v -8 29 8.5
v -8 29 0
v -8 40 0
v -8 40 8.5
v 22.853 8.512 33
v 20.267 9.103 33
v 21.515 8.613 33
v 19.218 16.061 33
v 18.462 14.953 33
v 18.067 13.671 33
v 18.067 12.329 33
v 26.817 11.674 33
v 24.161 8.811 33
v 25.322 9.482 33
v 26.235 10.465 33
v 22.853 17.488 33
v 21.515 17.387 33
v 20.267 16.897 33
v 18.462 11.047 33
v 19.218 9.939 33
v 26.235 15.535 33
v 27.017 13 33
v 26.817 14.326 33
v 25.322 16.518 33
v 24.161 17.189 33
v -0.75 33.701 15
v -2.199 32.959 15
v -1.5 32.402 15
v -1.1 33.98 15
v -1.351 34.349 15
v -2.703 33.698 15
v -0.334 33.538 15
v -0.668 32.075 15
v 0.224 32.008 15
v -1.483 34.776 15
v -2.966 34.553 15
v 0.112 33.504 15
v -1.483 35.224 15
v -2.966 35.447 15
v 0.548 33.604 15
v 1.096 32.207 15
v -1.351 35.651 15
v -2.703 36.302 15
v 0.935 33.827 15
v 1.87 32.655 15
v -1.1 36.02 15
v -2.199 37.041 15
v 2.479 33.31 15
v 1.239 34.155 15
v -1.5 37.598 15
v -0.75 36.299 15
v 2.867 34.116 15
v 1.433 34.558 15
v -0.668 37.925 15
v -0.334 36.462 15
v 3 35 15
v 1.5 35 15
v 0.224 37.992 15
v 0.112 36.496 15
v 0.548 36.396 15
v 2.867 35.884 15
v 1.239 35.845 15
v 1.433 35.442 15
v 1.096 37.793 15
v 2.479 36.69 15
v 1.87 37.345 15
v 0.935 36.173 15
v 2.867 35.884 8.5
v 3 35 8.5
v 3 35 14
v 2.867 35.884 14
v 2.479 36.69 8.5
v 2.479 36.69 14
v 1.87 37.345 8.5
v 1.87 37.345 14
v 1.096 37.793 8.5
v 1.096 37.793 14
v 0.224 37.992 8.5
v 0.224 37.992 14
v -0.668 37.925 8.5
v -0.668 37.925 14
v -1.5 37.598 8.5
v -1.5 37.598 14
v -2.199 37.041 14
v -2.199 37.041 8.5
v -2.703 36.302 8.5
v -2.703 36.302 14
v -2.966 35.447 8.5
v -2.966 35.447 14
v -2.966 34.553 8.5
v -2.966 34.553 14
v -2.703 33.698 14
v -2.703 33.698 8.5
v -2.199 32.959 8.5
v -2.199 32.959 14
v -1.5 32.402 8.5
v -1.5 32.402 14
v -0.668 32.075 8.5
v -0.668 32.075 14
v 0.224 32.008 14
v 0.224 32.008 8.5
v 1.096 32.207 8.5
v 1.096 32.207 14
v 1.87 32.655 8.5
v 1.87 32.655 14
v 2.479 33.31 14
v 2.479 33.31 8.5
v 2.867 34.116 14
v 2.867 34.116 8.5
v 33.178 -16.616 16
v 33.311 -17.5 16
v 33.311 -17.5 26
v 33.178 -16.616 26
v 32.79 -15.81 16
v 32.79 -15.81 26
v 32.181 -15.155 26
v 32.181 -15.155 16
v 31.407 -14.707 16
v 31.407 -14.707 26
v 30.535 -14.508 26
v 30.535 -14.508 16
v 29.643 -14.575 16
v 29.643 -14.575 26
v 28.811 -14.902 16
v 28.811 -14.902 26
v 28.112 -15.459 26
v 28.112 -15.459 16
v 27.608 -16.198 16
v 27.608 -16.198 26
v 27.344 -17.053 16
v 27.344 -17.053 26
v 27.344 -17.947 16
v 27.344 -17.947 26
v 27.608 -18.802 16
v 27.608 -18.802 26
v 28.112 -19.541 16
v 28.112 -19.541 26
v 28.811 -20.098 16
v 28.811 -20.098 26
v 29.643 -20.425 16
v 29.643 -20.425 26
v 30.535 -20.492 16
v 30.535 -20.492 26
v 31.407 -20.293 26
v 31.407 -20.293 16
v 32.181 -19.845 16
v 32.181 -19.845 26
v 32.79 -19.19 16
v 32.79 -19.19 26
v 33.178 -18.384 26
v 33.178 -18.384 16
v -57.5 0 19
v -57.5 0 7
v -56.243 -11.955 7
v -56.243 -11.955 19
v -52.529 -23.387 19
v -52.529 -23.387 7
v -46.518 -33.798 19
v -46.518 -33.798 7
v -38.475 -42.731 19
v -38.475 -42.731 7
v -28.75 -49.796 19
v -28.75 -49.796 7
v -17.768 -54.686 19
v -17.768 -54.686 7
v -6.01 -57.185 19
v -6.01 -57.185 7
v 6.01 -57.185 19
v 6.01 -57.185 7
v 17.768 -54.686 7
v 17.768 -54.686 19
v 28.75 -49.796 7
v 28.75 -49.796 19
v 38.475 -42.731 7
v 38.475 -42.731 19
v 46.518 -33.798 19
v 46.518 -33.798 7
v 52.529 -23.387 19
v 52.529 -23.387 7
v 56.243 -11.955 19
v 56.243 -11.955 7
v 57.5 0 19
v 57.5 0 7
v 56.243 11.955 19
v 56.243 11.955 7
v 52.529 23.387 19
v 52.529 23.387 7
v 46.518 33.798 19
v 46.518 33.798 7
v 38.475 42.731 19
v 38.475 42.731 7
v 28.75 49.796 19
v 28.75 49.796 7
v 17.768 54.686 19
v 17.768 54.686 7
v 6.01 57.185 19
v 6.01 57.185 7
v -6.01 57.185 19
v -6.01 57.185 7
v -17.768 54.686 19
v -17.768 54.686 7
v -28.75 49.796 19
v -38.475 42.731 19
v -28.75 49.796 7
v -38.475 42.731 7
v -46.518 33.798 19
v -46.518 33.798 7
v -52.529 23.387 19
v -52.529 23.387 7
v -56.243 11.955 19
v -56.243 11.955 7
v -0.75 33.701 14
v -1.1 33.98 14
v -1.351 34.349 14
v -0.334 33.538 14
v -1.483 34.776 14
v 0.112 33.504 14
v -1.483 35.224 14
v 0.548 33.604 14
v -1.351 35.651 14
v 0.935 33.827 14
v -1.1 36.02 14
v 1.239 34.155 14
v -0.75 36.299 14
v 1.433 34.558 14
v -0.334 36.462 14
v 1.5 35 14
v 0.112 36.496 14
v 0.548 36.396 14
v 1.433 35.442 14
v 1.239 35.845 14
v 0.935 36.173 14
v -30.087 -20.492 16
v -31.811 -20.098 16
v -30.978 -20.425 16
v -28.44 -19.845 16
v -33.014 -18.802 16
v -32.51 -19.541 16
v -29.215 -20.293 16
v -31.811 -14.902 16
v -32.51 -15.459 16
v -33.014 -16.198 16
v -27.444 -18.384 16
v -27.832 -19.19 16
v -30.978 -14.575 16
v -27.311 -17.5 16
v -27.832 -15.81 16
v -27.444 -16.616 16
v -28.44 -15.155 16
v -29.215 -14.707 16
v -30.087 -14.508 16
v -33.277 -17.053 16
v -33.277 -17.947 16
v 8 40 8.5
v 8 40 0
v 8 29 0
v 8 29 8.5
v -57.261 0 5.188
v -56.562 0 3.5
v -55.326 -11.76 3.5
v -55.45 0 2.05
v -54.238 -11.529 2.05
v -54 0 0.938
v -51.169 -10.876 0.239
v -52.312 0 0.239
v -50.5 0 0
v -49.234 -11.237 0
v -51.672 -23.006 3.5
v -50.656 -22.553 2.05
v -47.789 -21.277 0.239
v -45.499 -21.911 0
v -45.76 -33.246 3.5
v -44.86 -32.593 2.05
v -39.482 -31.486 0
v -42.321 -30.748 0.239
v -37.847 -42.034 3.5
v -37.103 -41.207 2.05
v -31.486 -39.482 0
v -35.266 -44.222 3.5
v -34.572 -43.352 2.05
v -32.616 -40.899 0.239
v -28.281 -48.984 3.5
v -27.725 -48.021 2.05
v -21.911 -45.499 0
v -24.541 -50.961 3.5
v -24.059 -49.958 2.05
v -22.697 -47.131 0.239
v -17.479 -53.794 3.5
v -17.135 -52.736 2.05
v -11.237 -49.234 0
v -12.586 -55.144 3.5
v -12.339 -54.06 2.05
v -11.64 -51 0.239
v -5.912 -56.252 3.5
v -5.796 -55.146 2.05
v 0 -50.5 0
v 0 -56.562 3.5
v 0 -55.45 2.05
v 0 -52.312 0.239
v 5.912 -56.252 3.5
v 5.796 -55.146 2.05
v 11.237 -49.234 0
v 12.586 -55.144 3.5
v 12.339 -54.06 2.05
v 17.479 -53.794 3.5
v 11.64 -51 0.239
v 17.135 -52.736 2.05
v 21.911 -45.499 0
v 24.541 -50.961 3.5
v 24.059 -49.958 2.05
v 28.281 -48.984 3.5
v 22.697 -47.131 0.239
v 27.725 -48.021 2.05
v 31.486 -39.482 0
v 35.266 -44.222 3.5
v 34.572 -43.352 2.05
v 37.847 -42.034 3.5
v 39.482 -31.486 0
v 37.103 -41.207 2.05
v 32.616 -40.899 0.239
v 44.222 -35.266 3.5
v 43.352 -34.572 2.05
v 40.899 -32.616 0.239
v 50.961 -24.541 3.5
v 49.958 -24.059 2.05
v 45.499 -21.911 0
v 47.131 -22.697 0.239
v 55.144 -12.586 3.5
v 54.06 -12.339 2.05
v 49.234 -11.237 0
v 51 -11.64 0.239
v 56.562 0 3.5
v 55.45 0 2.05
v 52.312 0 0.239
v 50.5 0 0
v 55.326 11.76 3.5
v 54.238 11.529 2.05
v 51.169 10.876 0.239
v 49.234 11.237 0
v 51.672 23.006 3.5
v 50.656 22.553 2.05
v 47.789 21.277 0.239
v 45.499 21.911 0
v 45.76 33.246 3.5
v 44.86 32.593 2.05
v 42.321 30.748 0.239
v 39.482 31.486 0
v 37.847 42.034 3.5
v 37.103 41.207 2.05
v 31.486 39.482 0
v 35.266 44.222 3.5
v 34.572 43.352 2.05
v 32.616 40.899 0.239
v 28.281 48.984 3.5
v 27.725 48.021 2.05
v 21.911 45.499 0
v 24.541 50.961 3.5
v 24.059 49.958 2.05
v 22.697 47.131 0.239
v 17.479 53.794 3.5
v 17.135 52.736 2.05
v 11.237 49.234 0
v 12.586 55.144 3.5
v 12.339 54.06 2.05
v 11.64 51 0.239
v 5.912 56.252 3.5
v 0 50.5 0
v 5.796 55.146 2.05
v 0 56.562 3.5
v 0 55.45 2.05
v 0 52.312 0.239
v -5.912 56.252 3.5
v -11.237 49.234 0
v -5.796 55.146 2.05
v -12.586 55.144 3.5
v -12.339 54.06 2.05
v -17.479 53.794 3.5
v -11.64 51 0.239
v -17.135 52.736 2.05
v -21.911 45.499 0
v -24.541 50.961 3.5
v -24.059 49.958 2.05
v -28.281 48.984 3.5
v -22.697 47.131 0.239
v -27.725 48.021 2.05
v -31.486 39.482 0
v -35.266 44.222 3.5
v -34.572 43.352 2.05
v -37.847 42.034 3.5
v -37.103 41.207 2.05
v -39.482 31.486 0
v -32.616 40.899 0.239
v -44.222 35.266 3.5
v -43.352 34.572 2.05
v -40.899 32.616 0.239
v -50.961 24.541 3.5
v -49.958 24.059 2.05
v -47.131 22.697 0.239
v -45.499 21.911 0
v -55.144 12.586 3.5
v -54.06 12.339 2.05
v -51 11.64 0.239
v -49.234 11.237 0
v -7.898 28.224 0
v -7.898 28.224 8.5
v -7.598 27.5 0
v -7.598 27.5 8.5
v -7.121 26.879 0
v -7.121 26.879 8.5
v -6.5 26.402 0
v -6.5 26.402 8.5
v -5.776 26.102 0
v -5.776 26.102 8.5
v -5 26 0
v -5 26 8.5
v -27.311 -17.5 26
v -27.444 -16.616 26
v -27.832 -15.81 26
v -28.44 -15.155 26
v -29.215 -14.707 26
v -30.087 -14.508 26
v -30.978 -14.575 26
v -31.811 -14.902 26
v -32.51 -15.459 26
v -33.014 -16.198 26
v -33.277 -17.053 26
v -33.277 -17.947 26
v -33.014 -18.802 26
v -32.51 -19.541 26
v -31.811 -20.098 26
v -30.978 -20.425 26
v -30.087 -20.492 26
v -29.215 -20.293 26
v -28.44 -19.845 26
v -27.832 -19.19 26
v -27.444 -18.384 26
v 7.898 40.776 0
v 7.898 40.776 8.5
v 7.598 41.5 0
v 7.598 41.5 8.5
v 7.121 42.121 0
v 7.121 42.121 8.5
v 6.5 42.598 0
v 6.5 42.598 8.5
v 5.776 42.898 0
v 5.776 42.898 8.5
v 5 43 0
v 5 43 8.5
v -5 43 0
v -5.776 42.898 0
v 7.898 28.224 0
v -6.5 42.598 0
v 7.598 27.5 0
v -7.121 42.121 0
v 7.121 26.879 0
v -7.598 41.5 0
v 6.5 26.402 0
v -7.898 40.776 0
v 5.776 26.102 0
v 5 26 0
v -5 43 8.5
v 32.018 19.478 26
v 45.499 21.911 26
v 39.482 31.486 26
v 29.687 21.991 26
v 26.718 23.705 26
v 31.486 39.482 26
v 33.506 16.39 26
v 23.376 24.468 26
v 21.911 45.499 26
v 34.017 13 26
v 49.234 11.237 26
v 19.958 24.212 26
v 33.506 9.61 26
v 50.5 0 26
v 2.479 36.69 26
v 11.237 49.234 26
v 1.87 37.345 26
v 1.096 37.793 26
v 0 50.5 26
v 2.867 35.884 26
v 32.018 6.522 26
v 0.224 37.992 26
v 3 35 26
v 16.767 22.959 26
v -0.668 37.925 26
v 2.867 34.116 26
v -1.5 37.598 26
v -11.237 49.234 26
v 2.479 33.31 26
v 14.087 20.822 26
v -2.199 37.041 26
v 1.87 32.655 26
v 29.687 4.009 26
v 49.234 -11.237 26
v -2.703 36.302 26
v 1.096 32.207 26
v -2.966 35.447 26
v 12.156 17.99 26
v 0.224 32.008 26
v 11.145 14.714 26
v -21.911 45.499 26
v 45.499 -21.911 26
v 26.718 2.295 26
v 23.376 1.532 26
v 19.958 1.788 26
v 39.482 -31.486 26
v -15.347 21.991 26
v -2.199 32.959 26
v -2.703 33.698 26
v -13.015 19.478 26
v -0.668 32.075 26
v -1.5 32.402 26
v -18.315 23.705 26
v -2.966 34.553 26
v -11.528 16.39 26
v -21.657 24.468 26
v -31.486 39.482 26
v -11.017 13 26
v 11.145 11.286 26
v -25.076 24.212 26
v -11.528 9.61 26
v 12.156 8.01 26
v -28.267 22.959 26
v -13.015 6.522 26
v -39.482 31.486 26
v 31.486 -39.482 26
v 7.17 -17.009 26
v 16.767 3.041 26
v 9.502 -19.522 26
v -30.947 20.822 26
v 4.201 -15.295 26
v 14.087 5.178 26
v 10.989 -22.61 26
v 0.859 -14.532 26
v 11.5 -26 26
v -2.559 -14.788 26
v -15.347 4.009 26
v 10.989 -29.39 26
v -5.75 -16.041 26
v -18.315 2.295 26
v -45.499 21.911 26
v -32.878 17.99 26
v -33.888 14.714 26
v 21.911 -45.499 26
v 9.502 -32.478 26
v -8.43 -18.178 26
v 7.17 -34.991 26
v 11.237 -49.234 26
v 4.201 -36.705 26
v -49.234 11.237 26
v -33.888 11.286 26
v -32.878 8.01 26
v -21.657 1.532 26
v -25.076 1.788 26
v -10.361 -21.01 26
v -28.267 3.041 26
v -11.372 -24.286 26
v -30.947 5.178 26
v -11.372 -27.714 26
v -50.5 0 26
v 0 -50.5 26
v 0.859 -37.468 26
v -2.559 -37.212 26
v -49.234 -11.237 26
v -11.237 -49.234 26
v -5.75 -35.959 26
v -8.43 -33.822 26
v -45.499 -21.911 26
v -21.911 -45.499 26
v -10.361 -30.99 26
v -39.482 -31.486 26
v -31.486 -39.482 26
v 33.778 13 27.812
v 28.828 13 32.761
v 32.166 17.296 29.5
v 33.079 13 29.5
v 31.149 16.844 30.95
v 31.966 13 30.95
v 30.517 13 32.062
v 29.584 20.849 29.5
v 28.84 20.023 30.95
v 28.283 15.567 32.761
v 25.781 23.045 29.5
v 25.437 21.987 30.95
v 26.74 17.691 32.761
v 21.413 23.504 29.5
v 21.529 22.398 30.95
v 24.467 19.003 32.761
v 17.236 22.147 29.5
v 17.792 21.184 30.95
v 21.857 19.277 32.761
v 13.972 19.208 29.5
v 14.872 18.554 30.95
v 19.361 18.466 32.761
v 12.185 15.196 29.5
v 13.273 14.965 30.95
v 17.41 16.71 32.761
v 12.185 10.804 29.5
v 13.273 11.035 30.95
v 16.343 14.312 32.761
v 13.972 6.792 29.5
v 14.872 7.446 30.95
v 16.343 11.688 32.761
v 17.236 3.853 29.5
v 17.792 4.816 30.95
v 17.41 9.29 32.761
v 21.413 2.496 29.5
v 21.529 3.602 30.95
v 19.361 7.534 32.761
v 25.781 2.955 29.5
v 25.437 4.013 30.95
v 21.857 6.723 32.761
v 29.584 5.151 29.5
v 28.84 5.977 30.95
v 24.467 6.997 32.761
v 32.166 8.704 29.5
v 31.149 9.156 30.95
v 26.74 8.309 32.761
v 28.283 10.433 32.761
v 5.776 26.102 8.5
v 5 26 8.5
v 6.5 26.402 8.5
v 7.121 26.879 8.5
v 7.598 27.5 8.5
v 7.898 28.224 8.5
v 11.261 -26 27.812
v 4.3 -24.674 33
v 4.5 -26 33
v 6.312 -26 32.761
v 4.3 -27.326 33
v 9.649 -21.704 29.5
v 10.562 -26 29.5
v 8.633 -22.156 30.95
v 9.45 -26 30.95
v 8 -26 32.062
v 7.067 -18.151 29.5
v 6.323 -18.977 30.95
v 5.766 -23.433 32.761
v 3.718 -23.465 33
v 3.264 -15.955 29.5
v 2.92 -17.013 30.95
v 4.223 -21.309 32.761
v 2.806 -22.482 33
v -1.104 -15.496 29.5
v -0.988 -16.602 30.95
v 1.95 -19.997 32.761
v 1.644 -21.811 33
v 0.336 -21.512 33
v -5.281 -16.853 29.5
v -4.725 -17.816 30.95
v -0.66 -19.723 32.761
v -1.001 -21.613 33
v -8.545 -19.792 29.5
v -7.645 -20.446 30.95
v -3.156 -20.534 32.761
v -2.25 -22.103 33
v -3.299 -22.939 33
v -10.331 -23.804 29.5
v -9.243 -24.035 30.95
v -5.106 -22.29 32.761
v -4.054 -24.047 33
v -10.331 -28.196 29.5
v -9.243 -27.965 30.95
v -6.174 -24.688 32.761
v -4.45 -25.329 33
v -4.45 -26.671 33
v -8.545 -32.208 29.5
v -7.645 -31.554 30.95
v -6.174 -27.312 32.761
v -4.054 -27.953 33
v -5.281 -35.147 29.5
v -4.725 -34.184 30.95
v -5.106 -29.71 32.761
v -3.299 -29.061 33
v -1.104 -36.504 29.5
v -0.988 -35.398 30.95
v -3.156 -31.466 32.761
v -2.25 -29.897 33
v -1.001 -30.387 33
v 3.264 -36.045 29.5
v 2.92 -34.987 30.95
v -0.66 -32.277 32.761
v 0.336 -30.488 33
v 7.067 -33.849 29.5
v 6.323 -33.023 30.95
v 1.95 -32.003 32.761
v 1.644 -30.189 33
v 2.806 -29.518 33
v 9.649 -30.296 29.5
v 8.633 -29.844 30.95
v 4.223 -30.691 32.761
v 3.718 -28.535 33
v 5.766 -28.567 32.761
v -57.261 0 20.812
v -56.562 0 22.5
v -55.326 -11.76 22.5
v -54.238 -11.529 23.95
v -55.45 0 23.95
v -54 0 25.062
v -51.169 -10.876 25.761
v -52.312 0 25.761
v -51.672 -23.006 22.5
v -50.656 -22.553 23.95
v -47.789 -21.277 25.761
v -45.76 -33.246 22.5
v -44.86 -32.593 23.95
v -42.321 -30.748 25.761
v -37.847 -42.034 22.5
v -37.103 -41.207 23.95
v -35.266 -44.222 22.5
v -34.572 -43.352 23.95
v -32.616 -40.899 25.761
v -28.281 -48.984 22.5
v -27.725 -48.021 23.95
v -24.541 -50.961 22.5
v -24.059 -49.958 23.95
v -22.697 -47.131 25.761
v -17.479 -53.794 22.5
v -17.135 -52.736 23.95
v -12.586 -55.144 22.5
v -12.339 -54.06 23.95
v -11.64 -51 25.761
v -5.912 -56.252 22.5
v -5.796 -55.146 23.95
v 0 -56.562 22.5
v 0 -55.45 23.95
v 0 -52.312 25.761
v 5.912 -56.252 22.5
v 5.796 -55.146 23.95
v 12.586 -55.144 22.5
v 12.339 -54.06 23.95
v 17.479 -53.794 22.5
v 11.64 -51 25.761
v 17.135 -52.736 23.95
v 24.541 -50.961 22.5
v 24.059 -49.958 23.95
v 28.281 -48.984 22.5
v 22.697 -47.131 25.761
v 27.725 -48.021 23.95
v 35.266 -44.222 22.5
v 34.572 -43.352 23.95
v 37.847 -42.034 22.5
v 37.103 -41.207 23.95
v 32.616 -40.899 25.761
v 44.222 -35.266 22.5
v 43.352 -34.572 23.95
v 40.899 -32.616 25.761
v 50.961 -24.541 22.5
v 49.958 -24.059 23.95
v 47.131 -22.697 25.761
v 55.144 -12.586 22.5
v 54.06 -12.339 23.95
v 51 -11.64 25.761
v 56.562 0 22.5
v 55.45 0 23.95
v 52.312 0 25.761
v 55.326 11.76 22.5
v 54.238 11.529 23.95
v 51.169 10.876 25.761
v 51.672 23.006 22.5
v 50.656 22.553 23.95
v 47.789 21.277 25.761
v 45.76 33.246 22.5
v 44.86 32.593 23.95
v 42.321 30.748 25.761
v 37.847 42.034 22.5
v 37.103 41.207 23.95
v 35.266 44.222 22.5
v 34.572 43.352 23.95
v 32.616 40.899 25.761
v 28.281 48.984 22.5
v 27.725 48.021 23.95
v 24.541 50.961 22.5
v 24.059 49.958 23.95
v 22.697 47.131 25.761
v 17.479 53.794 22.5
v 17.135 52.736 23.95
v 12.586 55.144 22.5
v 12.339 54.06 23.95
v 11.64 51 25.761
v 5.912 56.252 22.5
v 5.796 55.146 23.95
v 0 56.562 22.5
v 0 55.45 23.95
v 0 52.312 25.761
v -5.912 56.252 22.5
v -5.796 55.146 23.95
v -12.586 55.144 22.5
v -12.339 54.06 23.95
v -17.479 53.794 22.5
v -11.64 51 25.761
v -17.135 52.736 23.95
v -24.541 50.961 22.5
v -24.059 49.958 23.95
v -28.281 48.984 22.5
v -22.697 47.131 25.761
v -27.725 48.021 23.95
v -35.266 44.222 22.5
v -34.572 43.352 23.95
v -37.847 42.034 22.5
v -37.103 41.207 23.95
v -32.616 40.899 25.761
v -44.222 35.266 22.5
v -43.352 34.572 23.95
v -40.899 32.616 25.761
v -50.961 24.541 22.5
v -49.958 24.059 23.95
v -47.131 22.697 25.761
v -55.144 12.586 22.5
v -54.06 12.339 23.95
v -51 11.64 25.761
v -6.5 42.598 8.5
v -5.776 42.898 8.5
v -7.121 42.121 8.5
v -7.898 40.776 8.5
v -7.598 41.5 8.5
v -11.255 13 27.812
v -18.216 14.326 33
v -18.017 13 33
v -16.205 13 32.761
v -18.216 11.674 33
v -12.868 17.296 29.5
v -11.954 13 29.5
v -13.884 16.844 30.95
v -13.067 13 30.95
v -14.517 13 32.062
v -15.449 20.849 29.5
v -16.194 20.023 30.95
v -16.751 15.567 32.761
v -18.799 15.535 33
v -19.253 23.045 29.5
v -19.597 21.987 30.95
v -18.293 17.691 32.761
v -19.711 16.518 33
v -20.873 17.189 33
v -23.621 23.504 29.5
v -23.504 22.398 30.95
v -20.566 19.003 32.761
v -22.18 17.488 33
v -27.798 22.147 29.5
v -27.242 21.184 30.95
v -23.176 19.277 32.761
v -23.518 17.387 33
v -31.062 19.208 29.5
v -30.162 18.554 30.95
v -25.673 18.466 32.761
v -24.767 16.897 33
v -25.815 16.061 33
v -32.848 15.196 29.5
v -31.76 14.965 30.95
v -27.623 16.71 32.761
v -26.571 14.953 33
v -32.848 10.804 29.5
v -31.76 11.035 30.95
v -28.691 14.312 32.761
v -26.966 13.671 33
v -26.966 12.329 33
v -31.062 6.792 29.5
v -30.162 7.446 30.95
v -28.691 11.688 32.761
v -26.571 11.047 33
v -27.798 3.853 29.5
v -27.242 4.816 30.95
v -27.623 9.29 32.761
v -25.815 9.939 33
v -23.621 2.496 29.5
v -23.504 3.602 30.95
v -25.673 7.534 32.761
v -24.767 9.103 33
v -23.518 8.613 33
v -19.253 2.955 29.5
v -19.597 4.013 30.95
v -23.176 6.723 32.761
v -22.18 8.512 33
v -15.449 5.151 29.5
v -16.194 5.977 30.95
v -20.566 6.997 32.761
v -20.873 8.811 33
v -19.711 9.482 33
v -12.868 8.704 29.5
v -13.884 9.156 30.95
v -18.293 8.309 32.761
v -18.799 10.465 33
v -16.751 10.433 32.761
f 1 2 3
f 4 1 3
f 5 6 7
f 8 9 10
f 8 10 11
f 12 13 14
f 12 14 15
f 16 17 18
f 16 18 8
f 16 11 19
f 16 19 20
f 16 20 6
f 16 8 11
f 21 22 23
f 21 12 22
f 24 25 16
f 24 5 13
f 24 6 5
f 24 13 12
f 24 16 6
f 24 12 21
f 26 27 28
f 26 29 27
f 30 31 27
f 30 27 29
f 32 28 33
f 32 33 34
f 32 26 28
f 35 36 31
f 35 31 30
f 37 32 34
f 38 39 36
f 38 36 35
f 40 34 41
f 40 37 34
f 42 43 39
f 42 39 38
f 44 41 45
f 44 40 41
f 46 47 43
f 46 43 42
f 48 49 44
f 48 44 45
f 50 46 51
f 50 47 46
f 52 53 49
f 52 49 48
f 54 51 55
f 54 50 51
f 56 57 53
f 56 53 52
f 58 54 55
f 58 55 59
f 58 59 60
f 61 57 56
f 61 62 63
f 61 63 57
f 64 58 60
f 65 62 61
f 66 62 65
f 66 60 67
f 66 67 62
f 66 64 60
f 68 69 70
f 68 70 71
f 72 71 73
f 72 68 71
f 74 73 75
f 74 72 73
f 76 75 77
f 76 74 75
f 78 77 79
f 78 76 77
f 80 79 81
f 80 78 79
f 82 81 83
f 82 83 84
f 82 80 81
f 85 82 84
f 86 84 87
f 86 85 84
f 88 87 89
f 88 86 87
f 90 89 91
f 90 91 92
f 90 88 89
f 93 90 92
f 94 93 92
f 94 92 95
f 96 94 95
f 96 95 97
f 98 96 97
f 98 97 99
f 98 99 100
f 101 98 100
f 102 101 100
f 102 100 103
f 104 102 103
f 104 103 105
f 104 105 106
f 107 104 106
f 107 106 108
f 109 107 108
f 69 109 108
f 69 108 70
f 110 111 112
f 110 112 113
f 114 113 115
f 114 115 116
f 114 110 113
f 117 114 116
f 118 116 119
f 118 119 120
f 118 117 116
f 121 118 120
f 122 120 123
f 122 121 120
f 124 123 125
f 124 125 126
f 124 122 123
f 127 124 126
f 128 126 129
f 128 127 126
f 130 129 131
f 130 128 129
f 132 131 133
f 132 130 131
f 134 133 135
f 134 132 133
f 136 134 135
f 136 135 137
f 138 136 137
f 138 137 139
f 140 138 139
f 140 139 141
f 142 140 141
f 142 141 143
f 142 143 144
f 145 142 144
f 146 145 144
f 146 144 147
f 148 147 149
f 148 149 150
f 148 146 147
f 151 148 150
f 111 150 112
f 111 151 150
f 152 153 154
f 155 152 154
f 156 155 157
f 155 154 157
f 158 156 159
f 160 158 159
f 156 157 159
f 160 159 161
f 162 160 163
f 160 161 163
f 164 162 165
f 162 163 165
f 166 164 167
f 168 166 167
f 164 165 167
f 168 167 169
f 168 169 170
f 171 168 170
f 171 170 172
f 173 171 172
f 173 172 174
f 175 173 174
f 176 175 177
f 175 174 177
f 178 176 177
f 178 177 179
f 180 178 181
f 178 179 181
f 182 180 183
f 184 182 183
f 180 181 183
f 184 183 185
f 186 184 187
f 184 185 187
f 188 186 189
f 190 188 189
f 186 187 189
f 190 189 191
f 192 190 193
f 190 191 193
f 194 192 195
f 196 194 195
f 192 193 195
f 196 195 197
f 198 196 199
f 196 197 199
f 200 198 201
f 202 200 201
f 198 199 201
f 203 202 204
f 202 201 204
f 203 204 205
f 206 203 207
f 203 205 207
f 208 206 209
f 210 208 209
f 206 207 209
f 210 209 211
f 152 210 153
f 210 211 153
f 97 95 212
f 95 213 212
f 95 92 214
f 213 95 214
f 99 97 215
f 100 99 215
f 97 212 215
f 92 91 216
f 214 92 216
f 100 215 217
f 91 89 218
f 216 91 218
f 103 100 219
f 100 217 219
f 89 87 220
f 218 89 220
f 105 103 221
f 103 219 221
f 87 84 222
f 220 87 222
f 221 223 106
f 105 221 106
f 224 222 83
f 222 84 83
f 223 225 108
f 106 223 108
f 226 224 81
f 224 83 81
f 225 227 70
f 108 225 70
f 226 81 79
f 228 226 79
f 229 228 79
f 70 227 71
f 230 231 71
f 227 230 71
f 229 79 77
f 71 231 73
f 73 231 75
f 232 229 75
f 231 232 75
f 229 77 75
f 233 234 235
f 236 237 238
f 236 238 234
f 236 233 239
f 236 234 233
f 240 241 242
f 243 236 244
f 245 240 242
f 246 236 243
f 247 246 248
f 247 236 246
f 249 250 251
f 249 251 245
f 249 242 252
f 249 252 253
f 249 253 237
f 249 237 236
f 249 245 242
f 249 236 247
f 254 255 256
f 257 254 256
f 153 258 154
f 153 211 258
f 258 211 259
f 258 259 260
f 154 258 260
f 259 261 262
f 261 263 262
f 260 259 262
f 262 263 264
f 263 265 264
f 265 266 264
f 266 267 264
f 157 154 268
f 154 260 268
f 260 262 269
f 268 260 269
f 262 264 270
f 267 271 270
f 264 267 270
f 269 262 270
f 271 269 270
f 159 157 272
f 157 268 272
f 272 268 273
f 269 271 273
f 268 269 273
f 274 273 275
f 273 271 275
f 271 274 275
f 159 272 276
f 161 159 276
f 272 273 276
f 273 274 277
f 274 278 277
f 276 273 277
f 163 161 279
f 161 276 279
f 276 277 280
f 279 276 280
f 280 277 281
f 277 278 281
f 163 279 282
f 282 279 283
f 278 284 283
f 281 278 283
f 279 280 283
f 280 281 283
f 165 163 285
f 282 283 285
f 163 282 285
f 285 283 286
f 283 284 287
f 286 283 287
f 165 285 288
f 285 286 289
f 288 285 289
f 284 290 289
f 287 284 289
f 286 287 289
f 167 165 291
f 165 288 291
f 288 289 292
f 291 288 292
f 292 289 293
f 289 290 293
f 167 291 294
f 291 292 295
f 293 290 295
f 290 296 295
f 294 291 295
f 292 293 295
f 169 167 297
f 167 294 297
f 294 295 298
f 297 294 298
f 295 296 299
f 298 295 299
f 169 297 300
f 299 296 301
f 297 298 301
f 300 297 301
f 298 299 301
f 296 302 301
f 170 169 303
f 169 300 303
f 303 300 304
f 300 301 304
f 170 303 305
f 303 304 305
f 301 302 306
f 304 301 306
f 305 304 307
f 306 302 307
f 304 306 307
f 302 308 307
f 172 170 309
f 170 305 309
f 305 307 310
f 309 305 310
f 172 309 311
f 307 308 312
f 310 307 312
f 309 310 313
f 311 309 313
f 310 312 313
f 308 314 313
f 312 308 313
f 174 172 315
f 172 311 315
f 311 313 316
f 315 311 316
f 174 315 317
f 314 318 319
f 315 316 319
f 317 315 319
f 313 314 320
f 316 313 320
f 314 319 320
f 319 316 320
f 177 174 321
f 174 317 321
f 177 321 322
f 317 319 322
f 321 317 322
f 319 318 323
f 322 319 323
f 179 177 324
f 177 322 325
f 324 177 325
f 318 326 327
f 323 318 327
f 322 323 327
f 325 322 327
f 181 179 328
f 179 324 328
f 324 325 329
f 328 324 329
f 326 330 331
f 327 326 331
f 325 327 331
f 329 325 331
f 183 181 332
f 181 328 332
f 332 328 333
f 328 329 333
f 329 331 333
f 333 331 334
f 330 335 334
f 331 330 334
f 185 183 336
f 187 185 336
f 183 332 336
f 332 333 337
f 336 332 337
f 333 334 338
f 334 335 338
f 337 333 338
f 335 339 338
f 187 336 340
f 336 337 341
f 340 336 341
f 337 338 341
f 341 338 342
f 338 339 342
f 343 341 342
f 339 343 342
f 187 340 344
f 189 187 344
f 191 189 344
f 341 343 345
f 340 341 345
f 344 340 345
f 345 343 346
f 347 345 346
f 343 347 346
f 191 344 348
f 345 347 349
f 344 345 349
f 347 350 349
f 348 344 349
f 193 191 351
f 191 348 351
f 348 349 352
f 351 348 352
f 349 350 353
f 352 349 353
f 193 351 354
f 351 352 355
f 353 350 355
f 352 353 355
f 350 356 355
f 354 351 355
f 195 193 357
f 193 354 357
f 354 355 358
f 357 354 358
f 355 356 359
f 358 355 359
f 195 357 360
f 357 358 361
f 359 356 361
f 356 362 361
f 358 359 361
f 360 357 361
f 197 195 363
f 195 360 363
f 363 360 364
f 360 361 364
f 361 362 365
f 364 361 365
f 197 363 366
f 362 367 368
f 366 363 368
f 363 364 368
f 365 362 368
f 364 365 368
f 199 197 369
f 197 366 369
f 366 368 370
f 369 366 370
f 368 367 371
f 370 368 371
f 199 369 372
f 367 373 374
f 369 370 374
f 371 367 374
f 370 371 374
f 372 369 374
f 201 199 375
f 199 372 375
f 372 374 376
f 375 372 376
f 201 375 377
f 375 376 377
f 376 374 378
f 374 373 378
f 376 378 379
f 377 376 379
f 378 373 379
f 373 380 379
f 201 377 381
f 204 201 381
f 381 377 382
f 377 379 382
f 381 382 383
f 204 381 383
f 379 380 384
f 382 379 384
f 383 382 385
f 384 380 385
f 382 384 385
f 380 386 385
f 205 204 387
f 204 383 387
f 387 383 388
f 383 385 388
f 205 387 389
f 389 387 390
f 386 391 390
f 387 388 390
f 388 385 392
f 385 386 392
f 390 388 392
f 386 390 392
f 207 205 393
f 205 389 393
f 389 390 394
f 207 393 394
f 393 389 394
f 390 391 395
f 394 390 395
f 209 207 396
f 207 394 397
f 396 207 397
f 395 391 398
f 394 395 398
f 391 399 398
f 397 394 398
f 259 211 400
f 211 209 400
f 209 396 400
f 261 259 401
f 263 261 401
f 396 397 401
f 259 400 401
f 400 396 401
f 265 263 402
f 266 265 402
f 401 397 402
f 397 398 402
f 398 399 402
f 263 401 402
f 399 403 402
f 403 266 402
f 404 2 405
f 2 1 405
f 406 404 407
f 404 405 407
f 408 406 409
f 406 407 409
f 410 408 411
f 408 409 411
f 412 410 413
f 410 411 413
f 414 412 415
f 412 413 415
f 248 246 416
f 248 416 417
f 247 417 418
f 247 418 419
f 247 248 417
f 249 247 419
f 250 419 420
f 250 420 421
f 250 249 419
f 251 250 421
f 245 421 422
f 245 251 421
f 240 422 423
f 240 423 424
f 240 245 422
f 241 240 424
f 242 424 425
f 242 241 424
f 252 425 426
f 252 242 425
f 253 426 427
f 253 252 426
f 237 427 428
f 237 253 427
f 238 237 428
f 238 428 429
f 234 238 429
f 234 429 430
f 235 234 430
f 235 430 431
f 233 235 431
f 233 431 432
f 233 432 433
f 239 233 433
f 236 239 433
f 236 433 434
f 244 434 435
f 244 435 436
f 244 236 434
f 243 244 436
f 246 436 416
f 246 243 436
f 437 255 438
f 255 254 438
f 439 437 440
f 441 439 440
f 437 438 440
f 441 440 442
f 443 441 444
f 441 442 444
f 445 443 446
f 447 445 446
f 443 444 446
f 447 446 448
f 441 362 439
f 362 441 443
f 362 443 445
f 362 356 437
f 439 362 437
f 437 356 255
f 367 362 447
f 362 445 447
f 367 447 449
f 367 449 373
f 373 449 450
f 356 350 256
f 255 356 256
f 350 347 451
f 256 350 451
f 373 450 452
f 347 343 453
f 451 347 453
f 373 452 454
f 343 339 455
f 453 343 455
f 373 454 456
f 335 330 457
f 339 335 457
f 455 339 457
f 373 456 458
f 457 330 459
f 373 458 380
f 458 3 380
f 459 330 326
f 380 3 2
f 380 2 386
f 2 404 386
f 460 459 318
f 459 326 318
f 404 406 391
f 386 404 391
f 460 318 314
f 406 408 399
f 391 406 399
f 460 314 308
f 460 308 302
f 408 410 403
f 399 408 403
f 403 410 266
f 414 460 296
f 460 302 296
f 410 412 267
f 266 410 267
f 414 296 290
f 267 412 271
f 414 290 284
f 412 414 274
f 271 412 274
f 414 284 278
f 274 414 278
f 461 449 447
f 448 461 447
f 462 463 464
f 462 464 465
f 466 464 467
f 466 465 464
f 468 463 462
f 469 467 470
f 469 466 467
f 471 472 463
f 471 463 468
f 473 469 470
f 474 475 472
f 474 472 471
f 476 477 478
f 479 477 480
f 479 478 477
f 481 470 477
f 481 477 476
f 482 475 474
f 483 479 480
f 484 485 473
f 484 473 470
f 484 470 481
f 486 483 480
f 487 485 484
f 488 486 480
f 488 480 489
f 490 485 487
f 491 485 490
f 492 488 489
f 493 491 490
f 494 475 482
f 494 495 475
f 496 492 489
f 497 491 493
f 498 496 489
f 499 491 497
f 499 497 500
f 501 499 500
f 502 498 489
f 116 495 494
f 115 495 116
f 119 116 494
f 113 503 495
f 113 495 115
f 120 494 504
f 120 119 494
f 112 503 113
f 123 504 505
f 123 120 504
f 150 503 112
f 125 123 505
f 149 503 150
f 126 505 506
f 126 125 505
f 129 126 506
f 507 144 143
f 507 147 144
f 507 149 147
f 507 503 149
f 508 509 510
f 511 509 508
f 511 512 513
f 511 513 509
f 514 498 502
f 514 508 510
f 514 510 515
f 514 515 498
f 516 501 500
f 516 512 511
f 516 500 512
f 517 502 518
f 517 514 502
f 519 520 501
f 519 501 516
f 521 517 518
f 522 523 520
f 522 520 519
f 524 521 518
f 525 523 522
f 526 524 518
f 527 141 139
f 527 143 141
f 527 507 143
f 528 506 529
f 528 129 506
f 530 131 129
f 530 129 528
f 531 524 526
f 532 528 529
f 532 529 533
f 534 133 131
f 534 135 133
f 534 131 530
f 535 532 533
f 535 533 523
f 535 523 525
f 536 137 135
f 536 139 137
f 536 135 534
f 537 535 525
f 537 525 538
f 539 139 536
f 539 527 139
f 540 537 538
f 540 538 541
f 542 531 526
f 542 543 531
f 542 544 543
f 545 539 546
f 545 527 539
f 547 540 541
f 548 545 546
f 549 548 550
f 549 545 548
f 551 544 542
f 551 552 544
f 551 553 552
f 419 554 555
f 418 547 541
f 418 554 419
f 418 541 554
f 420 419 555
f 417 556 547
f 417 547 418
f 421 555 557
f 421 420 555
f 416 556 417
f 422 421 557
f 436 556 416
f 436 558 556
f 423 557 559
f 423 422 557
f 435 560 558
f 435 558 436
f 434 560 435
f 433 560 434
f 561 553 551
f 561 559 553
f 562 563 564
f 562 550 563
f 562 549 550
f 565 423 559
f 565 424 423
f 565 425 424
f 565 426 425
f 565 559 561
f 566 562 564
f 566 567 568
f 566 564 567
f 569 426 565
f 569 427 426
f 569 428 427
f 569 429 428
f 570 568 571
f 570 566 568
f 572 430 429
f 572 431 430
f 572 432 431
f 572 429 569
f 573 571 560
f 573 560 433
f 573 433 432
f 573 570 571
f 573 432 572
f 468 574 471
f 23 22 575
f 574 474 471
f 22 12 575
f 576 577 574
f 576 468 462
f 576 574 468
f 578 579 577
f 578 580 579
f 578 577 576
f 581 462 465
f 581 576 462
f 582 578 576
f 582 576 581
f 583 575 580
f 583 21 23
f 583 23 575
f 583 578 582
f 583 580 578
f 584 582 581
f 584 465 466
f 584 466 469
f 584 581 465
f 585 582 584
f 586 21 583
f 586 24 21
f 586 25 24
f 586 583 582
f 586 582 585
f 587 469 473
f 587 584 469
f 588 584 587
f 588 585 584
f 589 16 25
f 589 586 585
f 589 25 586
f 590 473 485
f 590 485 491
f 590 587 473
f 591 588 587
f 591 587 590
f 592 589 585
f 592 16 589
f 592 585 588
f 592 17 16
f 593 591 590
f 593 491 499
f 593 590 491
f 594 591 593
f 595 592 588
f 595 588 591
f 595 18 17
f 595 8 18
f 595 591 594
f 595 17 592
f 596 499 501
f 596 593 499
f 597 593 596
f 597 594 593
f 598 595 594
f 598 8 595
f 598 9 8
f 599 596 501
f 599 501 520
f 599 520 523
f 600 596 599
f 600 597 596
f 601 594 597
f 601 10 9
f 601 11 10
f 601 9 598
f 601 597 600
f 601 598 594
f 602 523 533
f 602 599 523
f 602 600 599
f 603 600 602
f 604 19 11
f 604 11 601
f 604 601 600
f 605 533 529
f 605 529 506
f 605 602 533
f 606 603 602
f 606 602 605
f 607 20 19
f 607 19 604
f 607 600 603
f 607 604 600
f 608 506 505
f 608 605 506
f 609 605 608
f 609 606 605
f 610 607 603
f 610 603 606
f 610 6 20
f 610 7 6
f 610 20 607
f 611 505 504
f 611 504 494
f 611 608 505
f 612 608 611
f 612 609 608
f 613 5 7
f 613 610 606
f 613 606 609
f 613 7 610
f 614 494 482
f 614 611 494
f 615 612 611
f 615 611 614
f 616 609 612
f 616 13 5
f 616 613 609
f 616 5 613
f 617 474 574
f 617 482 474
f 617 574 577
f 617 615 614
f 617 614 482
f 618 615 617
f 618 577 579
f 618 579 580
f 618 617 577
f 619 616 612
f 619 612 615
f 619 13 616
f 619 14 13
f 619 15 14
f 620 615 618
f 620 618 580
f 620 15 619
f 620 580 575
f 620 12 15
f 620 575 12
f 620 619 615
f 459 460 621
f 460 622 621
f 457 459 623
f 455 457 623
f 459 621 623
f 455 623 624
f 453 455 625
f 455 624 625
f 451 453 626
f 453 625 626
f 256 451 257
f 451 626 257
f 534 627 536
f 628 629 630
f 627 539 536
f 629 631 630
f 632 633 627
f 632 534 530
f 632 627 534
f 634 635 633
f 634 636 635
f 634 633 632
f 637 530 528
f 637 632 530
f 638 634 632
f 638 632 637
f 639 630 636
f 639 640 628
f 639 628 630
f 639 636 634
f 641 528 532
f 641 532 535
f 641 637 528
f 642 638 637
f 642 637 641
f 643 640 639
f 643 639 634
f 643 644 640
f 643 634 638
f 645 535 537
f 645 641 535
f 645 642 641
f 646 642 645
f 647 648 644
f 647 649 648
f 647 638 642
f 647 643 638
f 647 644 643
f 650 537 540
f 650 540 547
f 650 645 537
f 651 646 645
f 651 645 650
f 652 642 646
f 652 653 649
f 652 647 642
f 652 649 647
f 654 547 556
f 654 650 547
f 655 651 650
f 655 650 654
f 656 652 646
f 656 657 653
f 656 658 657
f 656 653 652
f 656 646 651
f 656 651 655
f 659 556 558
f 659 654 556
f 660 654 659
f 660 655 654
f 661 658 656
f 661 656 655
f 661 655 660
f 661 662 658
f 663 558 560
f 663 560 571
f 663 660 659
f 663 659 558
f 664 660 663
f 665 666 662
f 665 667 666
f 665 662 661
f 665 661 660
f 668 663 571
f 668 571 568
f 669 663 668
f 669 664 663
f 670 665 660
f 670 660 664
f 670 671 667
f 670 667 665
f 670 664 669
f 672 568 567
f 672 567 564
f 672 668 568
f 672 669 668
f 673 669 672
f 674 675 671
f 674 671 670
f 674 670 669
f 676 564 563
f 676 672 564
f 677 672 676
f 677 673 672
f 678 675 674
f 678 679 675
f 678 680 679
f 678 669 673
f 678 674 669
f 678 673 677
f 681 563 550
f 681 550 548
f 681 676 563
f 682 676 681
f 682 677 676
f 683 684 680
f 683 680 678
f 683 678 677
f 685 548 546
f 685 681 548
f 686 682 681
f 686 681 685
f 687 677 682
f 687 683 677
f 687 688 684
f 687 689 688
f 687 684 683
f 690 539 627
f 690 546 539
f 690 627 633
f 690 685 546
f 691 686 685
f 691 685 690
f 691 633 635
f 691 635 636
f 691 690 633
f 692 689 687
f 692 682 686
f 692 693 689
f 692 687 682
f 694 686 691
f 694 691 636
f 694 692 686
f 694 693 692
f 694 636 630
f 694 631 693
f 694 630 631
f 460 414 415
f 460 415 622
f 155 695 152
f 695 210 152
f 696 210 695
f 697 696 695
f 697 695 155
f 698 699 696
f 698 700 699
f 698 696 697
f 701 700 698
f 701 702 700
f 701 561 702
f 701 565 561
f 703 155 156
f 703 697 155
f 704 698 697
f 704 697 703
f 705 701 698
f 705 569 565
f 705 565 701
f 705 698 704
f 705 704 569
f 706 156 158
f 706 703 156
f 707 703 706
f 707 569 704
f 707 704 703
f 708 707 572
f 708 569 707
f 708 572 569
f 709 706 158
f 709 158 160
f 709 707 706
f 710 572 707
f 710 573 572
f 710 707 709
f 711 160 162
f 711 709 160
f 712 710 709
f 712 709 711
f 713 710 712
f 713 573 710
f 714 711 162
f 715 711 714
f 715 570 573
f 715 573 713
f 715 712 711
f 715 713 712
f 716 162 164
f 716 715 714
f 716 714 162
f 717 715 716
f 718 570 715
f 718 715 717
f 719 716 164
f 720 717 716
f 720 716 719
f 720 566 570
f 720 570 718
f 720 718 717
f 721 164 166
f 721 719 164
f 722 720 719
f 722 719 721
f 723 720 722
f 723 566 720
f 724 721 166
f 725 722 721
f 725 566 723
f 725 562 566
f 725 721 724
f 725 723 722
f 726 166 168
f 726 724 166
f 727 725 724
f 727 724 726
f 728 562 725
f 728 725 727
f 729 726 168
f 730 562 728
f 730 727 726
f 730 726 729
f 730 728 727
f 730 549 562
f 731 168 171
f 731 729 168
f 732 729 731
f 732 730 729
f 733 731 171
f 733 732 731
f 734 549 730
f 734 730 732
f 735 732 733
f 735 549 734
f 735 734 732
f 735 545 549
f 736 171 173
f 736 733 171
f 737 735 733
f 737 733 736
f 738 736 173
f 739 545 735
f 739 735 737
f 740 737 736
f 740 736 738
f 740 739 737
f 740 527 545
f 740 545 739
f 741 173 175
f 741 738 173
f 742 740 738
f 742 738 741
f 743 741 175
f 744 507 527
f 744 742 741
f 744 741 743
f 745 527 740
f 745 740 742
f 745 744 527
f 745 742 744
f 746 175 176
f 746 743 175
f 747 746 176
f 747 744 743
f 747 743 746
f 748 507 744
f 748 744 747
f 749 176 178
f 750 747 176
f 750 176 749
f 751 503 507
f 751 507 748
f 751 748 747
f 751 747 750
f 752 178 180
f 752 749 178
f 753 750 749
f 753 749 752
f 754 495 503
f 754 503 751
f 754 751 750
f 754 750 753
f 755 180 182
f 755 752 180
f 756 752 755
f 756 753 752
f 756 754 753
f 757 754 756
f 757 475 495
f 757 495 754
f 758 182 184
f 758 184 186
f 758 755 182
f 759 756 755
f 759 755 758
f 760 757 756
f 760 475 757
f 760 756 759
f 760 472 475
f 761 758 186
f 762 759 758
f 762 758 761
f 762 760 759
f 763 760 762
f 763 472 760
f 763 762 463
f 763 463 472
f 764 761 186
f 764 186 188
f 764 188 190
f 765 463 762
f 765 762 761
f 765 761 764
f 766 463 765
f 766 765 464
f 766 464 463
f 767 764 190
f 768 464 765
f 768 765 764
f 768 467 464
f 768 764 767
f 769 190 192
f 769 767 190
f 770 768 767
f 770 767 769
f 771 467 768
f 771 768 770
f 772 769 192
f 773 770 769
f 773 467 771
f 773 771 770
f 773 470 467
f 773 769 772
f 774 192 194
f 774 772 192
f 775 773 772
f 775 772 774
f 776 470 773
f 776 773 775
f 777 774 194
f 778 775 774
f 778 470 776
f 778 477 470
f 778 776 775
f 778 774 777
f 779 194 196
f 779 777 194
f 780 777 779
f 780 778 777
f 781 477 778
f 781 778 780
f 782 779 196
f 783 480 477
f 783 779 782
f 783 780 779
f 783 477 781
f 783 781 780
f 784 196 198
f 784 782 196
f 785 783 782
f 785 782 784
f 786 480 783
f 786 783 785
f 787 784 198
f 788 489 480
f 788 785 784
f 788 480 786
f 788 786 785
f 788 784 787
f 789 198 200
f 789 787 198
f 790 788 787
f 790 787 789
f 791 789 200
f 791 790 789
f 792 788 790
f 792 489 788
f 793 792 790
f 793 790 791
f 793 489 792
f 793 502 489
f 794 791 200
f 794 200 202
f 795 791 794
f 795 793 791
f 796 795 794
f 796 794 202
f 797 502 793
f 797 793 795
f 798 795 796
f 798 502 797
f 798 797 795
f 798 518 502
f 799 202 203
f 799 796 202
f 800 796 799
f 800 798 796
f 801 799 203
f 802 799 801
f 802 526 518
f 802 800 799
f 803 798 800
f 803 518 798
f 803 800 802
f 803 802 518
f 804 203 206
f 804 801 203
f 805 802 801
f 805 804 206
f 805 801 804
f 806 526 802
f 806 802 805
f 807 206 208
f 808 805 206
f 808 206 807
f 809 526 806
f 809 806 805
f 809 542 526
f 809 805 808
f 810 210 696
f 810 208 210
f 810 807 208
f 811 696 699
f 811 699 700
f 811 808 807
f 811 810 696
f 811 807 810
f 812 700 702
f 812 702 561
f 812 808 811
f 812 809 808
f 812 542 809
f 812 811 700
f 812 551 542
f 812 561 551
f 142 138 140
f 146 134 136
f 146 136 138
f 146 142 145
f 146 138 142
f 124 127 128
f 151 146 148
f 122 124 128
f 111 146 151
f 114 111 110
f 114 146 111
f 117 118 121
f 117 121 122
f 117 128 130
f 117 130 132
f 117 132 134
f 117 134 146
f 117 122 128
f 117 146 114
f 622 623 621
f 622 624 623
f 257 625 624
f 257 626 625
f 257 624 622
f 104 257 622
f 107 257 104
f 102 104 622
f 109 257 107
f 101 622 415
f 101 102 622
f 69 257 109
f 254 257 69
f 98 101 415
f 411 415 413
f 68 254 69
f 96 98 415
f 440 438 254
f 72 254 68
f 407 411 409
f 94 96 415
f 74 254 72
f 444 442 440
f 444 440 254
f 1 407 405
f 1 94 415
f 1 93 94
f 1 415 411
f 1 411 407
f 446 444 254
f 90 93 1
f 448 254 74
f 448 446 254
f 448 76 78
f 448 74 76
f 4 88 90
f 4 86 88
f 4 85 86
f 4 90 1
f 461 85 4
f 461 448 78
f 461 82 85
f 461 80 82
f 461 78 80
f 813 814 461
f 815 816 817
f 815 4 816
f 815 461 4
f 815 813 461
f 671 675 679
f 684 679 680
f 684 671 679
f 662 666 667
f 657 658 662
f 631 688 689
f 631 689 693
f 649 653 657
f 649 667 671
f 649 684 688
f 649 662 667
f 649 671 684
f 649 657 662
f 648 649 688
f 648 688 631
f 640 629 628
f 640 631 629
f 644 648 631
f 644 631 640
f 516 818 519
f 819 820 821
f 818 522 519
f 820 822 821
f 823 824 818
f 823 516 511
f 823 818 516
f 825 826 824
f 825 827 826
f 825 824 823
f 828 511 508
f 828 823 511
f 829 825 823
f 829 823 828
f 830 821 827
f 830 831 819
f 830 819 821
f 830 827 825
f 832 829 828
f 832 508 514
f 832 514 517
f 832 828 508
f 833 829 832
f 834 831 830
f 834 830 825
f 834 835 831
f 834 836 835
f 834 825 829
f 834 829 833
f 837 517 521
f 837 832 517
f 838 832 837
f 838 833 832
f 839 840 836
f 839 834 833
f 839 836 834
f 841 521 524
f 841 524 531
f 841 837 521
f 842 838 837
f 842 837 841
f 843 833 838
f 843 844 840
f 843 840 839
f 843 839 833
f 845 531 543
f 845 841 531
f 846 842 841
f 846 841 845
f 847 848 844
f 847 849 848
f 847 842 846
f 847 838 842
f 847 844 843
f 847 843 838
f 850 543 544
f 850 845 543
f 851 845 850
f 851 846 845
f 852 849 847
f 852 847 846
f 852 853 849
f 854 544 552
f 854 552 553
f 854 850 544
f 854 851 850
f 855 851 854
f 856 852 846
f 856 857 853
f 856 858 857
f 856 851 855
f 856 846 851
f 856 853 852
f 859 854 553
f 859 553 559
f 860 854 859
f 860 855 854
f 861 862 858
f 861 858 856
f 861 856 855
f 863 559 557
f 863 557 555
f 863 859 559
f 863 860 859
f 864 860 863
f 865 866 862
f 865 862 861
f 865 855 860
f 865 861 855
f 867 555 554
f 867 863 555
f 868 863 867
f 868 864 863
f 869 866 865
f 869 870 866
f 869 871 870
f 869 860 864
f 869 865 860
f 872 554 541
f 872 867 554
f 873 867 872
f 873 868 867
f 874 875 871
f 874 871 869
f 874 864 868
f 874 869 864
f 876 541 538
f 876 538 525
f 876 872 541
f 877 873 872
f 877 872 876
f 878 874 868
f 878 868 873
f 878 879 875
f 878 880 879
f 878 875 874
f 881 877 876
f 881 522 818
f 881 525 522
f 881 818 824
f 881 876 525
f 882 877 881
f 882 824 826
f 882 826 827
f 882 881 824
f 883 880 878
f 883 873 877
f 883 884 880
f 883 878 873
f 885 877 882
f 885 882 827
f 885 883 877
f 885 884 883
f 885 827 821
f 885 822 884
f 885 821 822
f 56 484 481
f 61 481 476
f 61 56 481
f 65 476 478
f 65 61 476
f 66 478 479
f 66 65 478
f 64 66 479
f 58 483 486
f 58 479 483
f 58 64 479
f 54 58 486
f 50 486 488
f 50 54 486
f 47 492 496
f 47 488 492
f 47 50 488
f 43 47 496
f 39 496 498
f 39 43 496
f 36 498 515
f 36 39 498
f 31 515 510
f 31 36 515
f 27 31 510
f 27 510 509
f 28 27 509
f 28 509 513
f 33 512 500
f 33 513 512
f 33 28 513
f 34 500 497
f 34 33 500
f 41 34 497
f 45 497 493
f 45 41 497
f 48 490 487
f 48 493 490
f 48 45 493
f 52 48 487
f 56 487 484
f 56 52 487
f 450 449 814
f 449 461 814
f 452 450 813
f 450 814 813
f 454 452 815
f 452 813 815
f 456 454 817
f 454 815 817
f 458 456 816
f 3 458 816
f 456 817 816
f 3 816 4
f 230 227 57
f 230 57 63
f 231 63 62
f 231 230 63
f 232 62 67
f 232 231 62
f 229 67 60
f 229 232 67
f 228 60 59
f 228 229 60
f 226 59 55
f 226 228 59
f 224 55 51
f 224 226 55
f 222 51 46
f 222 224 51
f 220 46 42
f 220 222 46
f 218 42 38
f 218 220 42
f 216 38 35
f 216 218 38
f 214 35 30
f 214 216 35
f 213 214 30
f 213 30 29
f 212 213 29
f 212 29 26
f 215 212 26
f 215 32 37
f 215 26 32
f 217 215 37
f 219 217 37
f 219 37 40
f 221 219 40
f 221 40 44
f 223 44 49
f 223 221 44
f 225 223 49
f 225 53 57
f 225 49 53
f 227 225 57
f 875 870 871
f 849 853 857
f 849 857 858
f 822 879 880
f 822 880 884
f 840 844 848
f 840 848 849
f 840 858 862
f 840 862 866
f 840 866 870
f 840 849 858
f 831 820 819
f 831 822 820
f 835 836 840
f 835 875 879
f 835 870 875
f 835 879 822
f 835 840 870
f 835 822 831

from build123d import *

# Parameters (mm, degrees)
SKETCH_1_R          = 57.5
EXTRUDE_1_DEPTH     = 26
FILLET_2_R          = 7
CUT_EXTRUDE_1_DEPTH = 8.5
SKETCH_3_R          = 1.5
CUT_EXTRUDE_3_DEPTH = 91.5
SKETCH_3_4_R        = 3
CUT_EXTRUDE_4_DEPTH = 14
CUT_EXTRUDE_START   = 15
SKETCH_3_6_R        = 3
CUT_EXTRUDE_5_DEPTH = 67
FILLET_10_R         = 3
FILLET_11_R         = 3
FILLET_12_R         = 3
FILLET_13_R         = 3
CUT_EXTRUDE_START_2 = 16
SKETCH_3_8_R        = 3
CUT_EXTRUDE_6_DEPTH = 10
EXTRUDE_START       = 26
SKETCH_3_21_R       = 11.5
EXTRUDE_3_DEPTH     = 7
FILLET_30_R         = 7
SKETCH_3_22_R       = 11.5
EXTRUDE_4_DEPTH     = 7
SKETCH_3_23_R       = 11.5
EXTRUDE_5_DEPTH     = 7
FILLET_32_R         = 7
FILLET_33_R         = 7


with BuildPart() as part:
    # Эскиз1 → Бобышка-Вытянуть1 (new body)
    with BuildSketch(Plane.XY):
        with Locations(Location((0, 0, 0), (0, 0, 180))):
            Circle(SKETCH_1_R)
    extrude(amount=EXTRUDE_1_DEPTH)

    # Скругление2
    fillet_2_edges = [part.edges().sort_by_distance(p)[0] for p in [
        (57.5, 0, 0),
        (57.5, 0, 26),
    ]]
    fillet(fillet_2_edges, radius=FILLET_2_R)

    # Эскиз2 → Вырез-Вытянуть1 (cut)
    with BuildSketch(Plane.XY):
        Polygon((0, 26), (-8, 26), (-8, 43), (8, 43), (8, 26), align=None)
    extrude(amount=CUT_EXTRUDE_1_DEPTH, mode=Mode.SUBTRACT)

    # Эскиз3 → Вырез-Вытянуть3 (cut)
    with BuildSketch(Plane.XY):
        with Locations((0, 35)):
            Circle(SKETCH_3_R)
    extrude(amount=CUT_EXTRUDE_3_DEPTH, mode=Mode.SUBTRACT)

    # Эскиз3<4> → Вырез-Вытянуть4 (cut)
    with BuildSketch(Plane.XY):
        with Locations((0, 35)):
            Circle(SKETCH_3_4_R)
    extrude(amount=CUT_EXTRUDE_4_DEPTH, mode=Mode.SUBTRACT)

    # Эскиз3<6> → Вырез-Вытянуть5 (cut)
    with BuildSketch(Plane.XY.offset(CUT_EXTRUDE_START)):
        with Locations((0, 35)):
            Circle(SKETCH_3_6_R)
    extrude(amount=CUT_EXTRUDE_5_DEPTH, mode=Mode.SUBTRACT)

    # Скругление10
    fillet_10_edges = [part.edges().sort_by_distance(p)[0] for p in [
        (8, 43, 4.25),
    ]]
    fillet(fillet_10_edges, radius=FILLET_10_R)

    # Скругление11
    fillet_11_edges = [part.edges().sort_by_distance(p)[0] for p in [
        (-8, 43, 4.25),
    ]]
    fillet(fillet_11_edges, radius=FILLET_11_R)

    # Скругление12
    fillet_12_edges = [part.edges().sort_by_distance(p)[0] for p in [
        (-8, 26, 4.25),
    ]]
    fillet(fillet_12_edges, radius=FILLET_12_R)

    # Скругление13
    fillet_13_edges = [part.edges().sort_by_distance(p)[0] for p in [
        (8, 26, 4.25),
    ]]
    fillet(fillet_13_edges, radius=FILLET_13_R)

    # Эскиз3<8> → Вырез-Вытянуть6 (cut)
    with BuildSketch(Plane.XY.offset(CUT_EXTRUDE_START_2)):
        with Locations((0, 35)):
            Circle(SKETCH_3_8_R)
        with Locations((30.310889132, -17.5)):
            Circle(SKETCH_3_8_R)
        with Locations((-30.310889132, -17.5)):
            Circle(SKETCH_3_8_R)
    extrude(amount=CUT_EXTRUDE_6_DEPTH, mode=Mode.SUBTRACT)

    # Эскиз3<21> → Бобышка-Вытянуть3 (add)
    with BuildSketch(Plane.XY.offset(EXTRUDE_START)):
        with Locations((-22.516660498, 13)):
            Circle(SKETCH_3_21_R)
    extrude(amount=EXTRUDE_3_DEPTH)

    # Скругление30
    fillet_30_edges = [part.edges().sort_by_distance(p)[0] for p in [
        (-34.016660498, 13, 33),
    ]]
    fillet(fillet_30_edges, radius=FILLET_30_R - 0.0001)  # a hair under: the kernel refuses the full size

    # Эскиз3<22> → Бобышка-Вытянуть4 (add)
    with BuildSketch(Plane.XY.offset(EXTRUDE_START)):
        with Locations((22.516660498, 13)):
            Circle(SKETCH_3_22_R)
    extrude(amount=EXTRUDE_4_DEPTH)

    # Эскиз3<23> → Бобышка-Вытянуть5 (add)
    with BuildSketch(Plane.XY.offset(EXTRUDE_START)):
        with Locations((0, -26)):
            Circle(SKETCH_3_23_R)
    extrude(amount=EXTRUDE_5_DEPTH)

    # Скругление32
    fillet_32_edges = [part.edges().sort_by_distance(p)[0] for p in [
        (11.016660498, 13, 33),
    ]]
    fillet(fillet_32_edges, radius=FILLET_32_R - 0.0001)  # a hair under: the kernel refuses the full size

    # Скругление33
    fillet_33_edges = [part.edges().sort_by_distance(p)[0] for p in [
        (-11.5, -26, 33),
    ]]
    fillet(fillet_33_edges, radius=FILLET_33_R - 0.0001)  # a hair under: the kernel refuses the full size


solid = part.part
